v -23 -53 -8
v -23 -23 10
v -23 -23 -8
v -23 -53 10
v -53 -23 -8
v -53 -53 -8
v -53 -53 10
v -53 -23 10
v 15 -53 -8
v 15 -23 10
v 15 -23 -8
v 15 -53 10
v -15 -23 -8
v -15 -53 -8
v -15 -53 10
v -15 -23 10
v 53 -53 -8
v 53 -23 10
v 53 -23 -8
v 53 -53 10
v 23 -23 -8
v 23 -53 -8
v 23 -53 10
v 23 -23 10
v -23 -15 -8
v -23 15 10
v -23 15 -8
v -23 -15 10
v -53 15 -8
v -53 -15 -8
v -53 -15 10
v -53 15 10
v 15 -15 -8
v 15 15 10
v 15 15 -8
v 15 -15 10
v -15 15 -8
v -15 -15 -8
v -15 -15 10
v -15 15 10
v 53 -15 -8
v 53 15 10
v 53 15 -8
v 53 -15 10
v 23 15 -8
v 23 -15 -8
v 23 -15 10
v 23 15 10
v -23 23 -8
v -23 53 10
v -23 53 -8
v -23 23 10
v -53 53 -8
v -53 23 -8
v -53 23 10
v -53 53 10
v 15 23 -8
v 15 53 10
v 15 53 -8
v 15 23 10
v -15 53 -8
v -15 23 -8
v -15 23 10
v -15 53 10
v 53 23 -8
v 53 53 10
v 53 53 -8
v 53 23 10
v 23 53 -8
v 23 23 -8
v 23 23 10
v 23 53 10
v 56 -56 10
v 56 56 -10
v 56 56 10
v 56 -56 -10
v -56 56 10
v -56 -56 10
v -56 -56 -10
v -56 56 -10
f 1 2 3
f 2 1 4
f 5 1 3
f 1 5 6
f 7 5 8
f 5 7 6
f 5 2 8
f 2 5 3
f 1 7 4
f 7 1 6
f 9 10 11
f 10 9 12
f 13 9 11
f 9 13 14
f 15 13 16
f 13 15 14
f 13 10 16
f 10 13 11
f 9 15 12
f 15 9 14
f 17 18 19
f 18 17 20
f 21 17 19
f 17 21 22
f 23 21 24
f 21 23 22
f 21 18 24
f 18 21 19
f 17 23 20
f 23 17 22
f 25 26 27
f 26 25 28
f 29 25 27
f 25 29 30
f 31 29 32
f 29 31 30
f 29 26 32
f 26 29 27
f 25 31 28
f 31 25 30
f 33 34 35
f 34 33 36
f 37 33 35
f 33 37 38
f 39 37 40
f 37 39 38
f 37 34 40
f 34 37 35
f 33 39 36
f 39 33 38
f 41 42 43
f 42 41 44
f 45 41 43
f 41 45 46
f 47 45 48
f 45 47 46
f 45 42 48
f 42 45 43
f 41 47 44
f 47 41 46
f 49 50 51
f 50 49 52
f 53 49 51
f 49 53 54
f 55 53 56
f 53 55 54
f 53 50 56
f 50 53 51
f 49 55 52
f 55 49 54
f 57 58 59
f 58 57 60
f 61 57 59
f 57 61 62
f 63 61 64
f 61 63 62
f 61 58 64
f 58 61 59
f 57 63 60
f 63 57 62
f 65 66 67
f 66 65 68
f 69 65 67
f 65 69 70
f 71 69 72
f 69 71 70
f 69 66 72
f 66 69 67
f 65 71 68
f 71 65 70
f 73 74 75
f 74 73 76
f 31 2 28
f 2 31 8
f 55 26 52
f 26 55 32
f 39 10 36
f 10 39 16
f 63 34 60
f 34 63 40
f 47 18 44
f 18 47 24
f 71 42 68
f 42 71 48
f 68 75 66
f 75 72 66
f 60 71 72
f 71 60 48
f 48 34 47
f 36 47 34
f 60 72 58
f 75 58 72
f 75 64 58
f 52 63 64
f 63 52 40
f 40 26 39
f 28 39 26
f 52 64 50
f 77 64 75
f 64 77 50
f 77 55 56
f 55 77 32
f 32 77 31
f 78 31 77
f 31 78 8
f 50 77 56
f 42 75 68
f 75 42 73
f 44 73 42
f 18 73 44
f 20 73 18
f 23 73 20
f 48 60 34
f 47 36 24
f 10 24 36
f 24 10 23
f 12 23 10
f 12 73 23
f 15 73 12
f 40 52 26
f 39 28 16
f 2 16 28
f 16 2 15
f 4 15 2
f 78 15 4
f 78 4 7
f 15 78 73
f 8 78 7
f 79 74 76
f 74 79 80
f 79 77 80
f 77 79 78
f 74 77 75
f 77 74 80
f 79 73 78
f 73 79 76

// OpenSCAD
$fn = 32;

// ----------------------------------------------------------------------
// Pocket plate 112 x 112 x 20
// 3 x 3 pockets 30 mm square, 18 mm deep
// ----------------------------------------------------------------------

// --- parameters (mm) ---
thickness = 20;  // plate thickness
floor_t = 2;     // material left under each pocket
pocket = 30;     // pocket side length
pitch_x = 38;    // pocket pitch along X
pitch_y = 38;    // pocket pitch along Y
cols = 3;        // pockets per row
rows = 3;        // rows of pockets

// --- derived feature positions (mm) ---
depth = thickness - floor_t;        // = 18   pocket depth, down to the floor
span_x = (cols - 1) * pitch_x;      // = 76   distance between outer pockets
span_y = (rows - 1) * pitch_y;      // = 76   distance between outer pocket rows
origin_x = -span_x / 2;             // = -38   X of the first pocket
origin_y = -span_y / 2;             // = -38   Y of the first pocket
plate = [span_x + pocket + 6, span_y + pocket + 6, thickness];  // = [112, 112, 20]   overall size: pockets plus 3 mm of wall on each side
feature_centers = [
  [origin_x + 0 * pitch_x, origin_y + 0 * pitch_y],
  [origin_x + 1 * pitch_x, origin_y + 0 * pitch_y],
  [origin_x + 2 * pitch_x, origin_y + 0 * pitch_y],
  [origin_x + 0 * pitch_x, origin_y + 1 * pitch_y],
  [origin_x + 1 * pitch_x, origin_y + 1 * pitch_y],
  [origin_x + 2 * pitch_x, origin_y + 1 * pitch_y],
  [origin_x + 0 * pitch_x, origin_y + 2 * pitch_y],
  [origin_x + 1 * pitch_x, origin_y + 2 * pitch_y],
  [origin_x + 2 * pitch_x, origin_y + 2 * pitch_y]
];   // pocket centres, used verbatim by the cutter loop

// plate outline, then one pocket per centre in feature_centers
difference() {
  cube(plate, center = true);
  for (centre = feature_centers)
    translate([centre[0] - pocket / 2, centre[1] - pocket / 2, plate[2] / 2 - depth])
      cube([pocket, pocket, depth + 1]);  // centred on the declared pocket centre
}
